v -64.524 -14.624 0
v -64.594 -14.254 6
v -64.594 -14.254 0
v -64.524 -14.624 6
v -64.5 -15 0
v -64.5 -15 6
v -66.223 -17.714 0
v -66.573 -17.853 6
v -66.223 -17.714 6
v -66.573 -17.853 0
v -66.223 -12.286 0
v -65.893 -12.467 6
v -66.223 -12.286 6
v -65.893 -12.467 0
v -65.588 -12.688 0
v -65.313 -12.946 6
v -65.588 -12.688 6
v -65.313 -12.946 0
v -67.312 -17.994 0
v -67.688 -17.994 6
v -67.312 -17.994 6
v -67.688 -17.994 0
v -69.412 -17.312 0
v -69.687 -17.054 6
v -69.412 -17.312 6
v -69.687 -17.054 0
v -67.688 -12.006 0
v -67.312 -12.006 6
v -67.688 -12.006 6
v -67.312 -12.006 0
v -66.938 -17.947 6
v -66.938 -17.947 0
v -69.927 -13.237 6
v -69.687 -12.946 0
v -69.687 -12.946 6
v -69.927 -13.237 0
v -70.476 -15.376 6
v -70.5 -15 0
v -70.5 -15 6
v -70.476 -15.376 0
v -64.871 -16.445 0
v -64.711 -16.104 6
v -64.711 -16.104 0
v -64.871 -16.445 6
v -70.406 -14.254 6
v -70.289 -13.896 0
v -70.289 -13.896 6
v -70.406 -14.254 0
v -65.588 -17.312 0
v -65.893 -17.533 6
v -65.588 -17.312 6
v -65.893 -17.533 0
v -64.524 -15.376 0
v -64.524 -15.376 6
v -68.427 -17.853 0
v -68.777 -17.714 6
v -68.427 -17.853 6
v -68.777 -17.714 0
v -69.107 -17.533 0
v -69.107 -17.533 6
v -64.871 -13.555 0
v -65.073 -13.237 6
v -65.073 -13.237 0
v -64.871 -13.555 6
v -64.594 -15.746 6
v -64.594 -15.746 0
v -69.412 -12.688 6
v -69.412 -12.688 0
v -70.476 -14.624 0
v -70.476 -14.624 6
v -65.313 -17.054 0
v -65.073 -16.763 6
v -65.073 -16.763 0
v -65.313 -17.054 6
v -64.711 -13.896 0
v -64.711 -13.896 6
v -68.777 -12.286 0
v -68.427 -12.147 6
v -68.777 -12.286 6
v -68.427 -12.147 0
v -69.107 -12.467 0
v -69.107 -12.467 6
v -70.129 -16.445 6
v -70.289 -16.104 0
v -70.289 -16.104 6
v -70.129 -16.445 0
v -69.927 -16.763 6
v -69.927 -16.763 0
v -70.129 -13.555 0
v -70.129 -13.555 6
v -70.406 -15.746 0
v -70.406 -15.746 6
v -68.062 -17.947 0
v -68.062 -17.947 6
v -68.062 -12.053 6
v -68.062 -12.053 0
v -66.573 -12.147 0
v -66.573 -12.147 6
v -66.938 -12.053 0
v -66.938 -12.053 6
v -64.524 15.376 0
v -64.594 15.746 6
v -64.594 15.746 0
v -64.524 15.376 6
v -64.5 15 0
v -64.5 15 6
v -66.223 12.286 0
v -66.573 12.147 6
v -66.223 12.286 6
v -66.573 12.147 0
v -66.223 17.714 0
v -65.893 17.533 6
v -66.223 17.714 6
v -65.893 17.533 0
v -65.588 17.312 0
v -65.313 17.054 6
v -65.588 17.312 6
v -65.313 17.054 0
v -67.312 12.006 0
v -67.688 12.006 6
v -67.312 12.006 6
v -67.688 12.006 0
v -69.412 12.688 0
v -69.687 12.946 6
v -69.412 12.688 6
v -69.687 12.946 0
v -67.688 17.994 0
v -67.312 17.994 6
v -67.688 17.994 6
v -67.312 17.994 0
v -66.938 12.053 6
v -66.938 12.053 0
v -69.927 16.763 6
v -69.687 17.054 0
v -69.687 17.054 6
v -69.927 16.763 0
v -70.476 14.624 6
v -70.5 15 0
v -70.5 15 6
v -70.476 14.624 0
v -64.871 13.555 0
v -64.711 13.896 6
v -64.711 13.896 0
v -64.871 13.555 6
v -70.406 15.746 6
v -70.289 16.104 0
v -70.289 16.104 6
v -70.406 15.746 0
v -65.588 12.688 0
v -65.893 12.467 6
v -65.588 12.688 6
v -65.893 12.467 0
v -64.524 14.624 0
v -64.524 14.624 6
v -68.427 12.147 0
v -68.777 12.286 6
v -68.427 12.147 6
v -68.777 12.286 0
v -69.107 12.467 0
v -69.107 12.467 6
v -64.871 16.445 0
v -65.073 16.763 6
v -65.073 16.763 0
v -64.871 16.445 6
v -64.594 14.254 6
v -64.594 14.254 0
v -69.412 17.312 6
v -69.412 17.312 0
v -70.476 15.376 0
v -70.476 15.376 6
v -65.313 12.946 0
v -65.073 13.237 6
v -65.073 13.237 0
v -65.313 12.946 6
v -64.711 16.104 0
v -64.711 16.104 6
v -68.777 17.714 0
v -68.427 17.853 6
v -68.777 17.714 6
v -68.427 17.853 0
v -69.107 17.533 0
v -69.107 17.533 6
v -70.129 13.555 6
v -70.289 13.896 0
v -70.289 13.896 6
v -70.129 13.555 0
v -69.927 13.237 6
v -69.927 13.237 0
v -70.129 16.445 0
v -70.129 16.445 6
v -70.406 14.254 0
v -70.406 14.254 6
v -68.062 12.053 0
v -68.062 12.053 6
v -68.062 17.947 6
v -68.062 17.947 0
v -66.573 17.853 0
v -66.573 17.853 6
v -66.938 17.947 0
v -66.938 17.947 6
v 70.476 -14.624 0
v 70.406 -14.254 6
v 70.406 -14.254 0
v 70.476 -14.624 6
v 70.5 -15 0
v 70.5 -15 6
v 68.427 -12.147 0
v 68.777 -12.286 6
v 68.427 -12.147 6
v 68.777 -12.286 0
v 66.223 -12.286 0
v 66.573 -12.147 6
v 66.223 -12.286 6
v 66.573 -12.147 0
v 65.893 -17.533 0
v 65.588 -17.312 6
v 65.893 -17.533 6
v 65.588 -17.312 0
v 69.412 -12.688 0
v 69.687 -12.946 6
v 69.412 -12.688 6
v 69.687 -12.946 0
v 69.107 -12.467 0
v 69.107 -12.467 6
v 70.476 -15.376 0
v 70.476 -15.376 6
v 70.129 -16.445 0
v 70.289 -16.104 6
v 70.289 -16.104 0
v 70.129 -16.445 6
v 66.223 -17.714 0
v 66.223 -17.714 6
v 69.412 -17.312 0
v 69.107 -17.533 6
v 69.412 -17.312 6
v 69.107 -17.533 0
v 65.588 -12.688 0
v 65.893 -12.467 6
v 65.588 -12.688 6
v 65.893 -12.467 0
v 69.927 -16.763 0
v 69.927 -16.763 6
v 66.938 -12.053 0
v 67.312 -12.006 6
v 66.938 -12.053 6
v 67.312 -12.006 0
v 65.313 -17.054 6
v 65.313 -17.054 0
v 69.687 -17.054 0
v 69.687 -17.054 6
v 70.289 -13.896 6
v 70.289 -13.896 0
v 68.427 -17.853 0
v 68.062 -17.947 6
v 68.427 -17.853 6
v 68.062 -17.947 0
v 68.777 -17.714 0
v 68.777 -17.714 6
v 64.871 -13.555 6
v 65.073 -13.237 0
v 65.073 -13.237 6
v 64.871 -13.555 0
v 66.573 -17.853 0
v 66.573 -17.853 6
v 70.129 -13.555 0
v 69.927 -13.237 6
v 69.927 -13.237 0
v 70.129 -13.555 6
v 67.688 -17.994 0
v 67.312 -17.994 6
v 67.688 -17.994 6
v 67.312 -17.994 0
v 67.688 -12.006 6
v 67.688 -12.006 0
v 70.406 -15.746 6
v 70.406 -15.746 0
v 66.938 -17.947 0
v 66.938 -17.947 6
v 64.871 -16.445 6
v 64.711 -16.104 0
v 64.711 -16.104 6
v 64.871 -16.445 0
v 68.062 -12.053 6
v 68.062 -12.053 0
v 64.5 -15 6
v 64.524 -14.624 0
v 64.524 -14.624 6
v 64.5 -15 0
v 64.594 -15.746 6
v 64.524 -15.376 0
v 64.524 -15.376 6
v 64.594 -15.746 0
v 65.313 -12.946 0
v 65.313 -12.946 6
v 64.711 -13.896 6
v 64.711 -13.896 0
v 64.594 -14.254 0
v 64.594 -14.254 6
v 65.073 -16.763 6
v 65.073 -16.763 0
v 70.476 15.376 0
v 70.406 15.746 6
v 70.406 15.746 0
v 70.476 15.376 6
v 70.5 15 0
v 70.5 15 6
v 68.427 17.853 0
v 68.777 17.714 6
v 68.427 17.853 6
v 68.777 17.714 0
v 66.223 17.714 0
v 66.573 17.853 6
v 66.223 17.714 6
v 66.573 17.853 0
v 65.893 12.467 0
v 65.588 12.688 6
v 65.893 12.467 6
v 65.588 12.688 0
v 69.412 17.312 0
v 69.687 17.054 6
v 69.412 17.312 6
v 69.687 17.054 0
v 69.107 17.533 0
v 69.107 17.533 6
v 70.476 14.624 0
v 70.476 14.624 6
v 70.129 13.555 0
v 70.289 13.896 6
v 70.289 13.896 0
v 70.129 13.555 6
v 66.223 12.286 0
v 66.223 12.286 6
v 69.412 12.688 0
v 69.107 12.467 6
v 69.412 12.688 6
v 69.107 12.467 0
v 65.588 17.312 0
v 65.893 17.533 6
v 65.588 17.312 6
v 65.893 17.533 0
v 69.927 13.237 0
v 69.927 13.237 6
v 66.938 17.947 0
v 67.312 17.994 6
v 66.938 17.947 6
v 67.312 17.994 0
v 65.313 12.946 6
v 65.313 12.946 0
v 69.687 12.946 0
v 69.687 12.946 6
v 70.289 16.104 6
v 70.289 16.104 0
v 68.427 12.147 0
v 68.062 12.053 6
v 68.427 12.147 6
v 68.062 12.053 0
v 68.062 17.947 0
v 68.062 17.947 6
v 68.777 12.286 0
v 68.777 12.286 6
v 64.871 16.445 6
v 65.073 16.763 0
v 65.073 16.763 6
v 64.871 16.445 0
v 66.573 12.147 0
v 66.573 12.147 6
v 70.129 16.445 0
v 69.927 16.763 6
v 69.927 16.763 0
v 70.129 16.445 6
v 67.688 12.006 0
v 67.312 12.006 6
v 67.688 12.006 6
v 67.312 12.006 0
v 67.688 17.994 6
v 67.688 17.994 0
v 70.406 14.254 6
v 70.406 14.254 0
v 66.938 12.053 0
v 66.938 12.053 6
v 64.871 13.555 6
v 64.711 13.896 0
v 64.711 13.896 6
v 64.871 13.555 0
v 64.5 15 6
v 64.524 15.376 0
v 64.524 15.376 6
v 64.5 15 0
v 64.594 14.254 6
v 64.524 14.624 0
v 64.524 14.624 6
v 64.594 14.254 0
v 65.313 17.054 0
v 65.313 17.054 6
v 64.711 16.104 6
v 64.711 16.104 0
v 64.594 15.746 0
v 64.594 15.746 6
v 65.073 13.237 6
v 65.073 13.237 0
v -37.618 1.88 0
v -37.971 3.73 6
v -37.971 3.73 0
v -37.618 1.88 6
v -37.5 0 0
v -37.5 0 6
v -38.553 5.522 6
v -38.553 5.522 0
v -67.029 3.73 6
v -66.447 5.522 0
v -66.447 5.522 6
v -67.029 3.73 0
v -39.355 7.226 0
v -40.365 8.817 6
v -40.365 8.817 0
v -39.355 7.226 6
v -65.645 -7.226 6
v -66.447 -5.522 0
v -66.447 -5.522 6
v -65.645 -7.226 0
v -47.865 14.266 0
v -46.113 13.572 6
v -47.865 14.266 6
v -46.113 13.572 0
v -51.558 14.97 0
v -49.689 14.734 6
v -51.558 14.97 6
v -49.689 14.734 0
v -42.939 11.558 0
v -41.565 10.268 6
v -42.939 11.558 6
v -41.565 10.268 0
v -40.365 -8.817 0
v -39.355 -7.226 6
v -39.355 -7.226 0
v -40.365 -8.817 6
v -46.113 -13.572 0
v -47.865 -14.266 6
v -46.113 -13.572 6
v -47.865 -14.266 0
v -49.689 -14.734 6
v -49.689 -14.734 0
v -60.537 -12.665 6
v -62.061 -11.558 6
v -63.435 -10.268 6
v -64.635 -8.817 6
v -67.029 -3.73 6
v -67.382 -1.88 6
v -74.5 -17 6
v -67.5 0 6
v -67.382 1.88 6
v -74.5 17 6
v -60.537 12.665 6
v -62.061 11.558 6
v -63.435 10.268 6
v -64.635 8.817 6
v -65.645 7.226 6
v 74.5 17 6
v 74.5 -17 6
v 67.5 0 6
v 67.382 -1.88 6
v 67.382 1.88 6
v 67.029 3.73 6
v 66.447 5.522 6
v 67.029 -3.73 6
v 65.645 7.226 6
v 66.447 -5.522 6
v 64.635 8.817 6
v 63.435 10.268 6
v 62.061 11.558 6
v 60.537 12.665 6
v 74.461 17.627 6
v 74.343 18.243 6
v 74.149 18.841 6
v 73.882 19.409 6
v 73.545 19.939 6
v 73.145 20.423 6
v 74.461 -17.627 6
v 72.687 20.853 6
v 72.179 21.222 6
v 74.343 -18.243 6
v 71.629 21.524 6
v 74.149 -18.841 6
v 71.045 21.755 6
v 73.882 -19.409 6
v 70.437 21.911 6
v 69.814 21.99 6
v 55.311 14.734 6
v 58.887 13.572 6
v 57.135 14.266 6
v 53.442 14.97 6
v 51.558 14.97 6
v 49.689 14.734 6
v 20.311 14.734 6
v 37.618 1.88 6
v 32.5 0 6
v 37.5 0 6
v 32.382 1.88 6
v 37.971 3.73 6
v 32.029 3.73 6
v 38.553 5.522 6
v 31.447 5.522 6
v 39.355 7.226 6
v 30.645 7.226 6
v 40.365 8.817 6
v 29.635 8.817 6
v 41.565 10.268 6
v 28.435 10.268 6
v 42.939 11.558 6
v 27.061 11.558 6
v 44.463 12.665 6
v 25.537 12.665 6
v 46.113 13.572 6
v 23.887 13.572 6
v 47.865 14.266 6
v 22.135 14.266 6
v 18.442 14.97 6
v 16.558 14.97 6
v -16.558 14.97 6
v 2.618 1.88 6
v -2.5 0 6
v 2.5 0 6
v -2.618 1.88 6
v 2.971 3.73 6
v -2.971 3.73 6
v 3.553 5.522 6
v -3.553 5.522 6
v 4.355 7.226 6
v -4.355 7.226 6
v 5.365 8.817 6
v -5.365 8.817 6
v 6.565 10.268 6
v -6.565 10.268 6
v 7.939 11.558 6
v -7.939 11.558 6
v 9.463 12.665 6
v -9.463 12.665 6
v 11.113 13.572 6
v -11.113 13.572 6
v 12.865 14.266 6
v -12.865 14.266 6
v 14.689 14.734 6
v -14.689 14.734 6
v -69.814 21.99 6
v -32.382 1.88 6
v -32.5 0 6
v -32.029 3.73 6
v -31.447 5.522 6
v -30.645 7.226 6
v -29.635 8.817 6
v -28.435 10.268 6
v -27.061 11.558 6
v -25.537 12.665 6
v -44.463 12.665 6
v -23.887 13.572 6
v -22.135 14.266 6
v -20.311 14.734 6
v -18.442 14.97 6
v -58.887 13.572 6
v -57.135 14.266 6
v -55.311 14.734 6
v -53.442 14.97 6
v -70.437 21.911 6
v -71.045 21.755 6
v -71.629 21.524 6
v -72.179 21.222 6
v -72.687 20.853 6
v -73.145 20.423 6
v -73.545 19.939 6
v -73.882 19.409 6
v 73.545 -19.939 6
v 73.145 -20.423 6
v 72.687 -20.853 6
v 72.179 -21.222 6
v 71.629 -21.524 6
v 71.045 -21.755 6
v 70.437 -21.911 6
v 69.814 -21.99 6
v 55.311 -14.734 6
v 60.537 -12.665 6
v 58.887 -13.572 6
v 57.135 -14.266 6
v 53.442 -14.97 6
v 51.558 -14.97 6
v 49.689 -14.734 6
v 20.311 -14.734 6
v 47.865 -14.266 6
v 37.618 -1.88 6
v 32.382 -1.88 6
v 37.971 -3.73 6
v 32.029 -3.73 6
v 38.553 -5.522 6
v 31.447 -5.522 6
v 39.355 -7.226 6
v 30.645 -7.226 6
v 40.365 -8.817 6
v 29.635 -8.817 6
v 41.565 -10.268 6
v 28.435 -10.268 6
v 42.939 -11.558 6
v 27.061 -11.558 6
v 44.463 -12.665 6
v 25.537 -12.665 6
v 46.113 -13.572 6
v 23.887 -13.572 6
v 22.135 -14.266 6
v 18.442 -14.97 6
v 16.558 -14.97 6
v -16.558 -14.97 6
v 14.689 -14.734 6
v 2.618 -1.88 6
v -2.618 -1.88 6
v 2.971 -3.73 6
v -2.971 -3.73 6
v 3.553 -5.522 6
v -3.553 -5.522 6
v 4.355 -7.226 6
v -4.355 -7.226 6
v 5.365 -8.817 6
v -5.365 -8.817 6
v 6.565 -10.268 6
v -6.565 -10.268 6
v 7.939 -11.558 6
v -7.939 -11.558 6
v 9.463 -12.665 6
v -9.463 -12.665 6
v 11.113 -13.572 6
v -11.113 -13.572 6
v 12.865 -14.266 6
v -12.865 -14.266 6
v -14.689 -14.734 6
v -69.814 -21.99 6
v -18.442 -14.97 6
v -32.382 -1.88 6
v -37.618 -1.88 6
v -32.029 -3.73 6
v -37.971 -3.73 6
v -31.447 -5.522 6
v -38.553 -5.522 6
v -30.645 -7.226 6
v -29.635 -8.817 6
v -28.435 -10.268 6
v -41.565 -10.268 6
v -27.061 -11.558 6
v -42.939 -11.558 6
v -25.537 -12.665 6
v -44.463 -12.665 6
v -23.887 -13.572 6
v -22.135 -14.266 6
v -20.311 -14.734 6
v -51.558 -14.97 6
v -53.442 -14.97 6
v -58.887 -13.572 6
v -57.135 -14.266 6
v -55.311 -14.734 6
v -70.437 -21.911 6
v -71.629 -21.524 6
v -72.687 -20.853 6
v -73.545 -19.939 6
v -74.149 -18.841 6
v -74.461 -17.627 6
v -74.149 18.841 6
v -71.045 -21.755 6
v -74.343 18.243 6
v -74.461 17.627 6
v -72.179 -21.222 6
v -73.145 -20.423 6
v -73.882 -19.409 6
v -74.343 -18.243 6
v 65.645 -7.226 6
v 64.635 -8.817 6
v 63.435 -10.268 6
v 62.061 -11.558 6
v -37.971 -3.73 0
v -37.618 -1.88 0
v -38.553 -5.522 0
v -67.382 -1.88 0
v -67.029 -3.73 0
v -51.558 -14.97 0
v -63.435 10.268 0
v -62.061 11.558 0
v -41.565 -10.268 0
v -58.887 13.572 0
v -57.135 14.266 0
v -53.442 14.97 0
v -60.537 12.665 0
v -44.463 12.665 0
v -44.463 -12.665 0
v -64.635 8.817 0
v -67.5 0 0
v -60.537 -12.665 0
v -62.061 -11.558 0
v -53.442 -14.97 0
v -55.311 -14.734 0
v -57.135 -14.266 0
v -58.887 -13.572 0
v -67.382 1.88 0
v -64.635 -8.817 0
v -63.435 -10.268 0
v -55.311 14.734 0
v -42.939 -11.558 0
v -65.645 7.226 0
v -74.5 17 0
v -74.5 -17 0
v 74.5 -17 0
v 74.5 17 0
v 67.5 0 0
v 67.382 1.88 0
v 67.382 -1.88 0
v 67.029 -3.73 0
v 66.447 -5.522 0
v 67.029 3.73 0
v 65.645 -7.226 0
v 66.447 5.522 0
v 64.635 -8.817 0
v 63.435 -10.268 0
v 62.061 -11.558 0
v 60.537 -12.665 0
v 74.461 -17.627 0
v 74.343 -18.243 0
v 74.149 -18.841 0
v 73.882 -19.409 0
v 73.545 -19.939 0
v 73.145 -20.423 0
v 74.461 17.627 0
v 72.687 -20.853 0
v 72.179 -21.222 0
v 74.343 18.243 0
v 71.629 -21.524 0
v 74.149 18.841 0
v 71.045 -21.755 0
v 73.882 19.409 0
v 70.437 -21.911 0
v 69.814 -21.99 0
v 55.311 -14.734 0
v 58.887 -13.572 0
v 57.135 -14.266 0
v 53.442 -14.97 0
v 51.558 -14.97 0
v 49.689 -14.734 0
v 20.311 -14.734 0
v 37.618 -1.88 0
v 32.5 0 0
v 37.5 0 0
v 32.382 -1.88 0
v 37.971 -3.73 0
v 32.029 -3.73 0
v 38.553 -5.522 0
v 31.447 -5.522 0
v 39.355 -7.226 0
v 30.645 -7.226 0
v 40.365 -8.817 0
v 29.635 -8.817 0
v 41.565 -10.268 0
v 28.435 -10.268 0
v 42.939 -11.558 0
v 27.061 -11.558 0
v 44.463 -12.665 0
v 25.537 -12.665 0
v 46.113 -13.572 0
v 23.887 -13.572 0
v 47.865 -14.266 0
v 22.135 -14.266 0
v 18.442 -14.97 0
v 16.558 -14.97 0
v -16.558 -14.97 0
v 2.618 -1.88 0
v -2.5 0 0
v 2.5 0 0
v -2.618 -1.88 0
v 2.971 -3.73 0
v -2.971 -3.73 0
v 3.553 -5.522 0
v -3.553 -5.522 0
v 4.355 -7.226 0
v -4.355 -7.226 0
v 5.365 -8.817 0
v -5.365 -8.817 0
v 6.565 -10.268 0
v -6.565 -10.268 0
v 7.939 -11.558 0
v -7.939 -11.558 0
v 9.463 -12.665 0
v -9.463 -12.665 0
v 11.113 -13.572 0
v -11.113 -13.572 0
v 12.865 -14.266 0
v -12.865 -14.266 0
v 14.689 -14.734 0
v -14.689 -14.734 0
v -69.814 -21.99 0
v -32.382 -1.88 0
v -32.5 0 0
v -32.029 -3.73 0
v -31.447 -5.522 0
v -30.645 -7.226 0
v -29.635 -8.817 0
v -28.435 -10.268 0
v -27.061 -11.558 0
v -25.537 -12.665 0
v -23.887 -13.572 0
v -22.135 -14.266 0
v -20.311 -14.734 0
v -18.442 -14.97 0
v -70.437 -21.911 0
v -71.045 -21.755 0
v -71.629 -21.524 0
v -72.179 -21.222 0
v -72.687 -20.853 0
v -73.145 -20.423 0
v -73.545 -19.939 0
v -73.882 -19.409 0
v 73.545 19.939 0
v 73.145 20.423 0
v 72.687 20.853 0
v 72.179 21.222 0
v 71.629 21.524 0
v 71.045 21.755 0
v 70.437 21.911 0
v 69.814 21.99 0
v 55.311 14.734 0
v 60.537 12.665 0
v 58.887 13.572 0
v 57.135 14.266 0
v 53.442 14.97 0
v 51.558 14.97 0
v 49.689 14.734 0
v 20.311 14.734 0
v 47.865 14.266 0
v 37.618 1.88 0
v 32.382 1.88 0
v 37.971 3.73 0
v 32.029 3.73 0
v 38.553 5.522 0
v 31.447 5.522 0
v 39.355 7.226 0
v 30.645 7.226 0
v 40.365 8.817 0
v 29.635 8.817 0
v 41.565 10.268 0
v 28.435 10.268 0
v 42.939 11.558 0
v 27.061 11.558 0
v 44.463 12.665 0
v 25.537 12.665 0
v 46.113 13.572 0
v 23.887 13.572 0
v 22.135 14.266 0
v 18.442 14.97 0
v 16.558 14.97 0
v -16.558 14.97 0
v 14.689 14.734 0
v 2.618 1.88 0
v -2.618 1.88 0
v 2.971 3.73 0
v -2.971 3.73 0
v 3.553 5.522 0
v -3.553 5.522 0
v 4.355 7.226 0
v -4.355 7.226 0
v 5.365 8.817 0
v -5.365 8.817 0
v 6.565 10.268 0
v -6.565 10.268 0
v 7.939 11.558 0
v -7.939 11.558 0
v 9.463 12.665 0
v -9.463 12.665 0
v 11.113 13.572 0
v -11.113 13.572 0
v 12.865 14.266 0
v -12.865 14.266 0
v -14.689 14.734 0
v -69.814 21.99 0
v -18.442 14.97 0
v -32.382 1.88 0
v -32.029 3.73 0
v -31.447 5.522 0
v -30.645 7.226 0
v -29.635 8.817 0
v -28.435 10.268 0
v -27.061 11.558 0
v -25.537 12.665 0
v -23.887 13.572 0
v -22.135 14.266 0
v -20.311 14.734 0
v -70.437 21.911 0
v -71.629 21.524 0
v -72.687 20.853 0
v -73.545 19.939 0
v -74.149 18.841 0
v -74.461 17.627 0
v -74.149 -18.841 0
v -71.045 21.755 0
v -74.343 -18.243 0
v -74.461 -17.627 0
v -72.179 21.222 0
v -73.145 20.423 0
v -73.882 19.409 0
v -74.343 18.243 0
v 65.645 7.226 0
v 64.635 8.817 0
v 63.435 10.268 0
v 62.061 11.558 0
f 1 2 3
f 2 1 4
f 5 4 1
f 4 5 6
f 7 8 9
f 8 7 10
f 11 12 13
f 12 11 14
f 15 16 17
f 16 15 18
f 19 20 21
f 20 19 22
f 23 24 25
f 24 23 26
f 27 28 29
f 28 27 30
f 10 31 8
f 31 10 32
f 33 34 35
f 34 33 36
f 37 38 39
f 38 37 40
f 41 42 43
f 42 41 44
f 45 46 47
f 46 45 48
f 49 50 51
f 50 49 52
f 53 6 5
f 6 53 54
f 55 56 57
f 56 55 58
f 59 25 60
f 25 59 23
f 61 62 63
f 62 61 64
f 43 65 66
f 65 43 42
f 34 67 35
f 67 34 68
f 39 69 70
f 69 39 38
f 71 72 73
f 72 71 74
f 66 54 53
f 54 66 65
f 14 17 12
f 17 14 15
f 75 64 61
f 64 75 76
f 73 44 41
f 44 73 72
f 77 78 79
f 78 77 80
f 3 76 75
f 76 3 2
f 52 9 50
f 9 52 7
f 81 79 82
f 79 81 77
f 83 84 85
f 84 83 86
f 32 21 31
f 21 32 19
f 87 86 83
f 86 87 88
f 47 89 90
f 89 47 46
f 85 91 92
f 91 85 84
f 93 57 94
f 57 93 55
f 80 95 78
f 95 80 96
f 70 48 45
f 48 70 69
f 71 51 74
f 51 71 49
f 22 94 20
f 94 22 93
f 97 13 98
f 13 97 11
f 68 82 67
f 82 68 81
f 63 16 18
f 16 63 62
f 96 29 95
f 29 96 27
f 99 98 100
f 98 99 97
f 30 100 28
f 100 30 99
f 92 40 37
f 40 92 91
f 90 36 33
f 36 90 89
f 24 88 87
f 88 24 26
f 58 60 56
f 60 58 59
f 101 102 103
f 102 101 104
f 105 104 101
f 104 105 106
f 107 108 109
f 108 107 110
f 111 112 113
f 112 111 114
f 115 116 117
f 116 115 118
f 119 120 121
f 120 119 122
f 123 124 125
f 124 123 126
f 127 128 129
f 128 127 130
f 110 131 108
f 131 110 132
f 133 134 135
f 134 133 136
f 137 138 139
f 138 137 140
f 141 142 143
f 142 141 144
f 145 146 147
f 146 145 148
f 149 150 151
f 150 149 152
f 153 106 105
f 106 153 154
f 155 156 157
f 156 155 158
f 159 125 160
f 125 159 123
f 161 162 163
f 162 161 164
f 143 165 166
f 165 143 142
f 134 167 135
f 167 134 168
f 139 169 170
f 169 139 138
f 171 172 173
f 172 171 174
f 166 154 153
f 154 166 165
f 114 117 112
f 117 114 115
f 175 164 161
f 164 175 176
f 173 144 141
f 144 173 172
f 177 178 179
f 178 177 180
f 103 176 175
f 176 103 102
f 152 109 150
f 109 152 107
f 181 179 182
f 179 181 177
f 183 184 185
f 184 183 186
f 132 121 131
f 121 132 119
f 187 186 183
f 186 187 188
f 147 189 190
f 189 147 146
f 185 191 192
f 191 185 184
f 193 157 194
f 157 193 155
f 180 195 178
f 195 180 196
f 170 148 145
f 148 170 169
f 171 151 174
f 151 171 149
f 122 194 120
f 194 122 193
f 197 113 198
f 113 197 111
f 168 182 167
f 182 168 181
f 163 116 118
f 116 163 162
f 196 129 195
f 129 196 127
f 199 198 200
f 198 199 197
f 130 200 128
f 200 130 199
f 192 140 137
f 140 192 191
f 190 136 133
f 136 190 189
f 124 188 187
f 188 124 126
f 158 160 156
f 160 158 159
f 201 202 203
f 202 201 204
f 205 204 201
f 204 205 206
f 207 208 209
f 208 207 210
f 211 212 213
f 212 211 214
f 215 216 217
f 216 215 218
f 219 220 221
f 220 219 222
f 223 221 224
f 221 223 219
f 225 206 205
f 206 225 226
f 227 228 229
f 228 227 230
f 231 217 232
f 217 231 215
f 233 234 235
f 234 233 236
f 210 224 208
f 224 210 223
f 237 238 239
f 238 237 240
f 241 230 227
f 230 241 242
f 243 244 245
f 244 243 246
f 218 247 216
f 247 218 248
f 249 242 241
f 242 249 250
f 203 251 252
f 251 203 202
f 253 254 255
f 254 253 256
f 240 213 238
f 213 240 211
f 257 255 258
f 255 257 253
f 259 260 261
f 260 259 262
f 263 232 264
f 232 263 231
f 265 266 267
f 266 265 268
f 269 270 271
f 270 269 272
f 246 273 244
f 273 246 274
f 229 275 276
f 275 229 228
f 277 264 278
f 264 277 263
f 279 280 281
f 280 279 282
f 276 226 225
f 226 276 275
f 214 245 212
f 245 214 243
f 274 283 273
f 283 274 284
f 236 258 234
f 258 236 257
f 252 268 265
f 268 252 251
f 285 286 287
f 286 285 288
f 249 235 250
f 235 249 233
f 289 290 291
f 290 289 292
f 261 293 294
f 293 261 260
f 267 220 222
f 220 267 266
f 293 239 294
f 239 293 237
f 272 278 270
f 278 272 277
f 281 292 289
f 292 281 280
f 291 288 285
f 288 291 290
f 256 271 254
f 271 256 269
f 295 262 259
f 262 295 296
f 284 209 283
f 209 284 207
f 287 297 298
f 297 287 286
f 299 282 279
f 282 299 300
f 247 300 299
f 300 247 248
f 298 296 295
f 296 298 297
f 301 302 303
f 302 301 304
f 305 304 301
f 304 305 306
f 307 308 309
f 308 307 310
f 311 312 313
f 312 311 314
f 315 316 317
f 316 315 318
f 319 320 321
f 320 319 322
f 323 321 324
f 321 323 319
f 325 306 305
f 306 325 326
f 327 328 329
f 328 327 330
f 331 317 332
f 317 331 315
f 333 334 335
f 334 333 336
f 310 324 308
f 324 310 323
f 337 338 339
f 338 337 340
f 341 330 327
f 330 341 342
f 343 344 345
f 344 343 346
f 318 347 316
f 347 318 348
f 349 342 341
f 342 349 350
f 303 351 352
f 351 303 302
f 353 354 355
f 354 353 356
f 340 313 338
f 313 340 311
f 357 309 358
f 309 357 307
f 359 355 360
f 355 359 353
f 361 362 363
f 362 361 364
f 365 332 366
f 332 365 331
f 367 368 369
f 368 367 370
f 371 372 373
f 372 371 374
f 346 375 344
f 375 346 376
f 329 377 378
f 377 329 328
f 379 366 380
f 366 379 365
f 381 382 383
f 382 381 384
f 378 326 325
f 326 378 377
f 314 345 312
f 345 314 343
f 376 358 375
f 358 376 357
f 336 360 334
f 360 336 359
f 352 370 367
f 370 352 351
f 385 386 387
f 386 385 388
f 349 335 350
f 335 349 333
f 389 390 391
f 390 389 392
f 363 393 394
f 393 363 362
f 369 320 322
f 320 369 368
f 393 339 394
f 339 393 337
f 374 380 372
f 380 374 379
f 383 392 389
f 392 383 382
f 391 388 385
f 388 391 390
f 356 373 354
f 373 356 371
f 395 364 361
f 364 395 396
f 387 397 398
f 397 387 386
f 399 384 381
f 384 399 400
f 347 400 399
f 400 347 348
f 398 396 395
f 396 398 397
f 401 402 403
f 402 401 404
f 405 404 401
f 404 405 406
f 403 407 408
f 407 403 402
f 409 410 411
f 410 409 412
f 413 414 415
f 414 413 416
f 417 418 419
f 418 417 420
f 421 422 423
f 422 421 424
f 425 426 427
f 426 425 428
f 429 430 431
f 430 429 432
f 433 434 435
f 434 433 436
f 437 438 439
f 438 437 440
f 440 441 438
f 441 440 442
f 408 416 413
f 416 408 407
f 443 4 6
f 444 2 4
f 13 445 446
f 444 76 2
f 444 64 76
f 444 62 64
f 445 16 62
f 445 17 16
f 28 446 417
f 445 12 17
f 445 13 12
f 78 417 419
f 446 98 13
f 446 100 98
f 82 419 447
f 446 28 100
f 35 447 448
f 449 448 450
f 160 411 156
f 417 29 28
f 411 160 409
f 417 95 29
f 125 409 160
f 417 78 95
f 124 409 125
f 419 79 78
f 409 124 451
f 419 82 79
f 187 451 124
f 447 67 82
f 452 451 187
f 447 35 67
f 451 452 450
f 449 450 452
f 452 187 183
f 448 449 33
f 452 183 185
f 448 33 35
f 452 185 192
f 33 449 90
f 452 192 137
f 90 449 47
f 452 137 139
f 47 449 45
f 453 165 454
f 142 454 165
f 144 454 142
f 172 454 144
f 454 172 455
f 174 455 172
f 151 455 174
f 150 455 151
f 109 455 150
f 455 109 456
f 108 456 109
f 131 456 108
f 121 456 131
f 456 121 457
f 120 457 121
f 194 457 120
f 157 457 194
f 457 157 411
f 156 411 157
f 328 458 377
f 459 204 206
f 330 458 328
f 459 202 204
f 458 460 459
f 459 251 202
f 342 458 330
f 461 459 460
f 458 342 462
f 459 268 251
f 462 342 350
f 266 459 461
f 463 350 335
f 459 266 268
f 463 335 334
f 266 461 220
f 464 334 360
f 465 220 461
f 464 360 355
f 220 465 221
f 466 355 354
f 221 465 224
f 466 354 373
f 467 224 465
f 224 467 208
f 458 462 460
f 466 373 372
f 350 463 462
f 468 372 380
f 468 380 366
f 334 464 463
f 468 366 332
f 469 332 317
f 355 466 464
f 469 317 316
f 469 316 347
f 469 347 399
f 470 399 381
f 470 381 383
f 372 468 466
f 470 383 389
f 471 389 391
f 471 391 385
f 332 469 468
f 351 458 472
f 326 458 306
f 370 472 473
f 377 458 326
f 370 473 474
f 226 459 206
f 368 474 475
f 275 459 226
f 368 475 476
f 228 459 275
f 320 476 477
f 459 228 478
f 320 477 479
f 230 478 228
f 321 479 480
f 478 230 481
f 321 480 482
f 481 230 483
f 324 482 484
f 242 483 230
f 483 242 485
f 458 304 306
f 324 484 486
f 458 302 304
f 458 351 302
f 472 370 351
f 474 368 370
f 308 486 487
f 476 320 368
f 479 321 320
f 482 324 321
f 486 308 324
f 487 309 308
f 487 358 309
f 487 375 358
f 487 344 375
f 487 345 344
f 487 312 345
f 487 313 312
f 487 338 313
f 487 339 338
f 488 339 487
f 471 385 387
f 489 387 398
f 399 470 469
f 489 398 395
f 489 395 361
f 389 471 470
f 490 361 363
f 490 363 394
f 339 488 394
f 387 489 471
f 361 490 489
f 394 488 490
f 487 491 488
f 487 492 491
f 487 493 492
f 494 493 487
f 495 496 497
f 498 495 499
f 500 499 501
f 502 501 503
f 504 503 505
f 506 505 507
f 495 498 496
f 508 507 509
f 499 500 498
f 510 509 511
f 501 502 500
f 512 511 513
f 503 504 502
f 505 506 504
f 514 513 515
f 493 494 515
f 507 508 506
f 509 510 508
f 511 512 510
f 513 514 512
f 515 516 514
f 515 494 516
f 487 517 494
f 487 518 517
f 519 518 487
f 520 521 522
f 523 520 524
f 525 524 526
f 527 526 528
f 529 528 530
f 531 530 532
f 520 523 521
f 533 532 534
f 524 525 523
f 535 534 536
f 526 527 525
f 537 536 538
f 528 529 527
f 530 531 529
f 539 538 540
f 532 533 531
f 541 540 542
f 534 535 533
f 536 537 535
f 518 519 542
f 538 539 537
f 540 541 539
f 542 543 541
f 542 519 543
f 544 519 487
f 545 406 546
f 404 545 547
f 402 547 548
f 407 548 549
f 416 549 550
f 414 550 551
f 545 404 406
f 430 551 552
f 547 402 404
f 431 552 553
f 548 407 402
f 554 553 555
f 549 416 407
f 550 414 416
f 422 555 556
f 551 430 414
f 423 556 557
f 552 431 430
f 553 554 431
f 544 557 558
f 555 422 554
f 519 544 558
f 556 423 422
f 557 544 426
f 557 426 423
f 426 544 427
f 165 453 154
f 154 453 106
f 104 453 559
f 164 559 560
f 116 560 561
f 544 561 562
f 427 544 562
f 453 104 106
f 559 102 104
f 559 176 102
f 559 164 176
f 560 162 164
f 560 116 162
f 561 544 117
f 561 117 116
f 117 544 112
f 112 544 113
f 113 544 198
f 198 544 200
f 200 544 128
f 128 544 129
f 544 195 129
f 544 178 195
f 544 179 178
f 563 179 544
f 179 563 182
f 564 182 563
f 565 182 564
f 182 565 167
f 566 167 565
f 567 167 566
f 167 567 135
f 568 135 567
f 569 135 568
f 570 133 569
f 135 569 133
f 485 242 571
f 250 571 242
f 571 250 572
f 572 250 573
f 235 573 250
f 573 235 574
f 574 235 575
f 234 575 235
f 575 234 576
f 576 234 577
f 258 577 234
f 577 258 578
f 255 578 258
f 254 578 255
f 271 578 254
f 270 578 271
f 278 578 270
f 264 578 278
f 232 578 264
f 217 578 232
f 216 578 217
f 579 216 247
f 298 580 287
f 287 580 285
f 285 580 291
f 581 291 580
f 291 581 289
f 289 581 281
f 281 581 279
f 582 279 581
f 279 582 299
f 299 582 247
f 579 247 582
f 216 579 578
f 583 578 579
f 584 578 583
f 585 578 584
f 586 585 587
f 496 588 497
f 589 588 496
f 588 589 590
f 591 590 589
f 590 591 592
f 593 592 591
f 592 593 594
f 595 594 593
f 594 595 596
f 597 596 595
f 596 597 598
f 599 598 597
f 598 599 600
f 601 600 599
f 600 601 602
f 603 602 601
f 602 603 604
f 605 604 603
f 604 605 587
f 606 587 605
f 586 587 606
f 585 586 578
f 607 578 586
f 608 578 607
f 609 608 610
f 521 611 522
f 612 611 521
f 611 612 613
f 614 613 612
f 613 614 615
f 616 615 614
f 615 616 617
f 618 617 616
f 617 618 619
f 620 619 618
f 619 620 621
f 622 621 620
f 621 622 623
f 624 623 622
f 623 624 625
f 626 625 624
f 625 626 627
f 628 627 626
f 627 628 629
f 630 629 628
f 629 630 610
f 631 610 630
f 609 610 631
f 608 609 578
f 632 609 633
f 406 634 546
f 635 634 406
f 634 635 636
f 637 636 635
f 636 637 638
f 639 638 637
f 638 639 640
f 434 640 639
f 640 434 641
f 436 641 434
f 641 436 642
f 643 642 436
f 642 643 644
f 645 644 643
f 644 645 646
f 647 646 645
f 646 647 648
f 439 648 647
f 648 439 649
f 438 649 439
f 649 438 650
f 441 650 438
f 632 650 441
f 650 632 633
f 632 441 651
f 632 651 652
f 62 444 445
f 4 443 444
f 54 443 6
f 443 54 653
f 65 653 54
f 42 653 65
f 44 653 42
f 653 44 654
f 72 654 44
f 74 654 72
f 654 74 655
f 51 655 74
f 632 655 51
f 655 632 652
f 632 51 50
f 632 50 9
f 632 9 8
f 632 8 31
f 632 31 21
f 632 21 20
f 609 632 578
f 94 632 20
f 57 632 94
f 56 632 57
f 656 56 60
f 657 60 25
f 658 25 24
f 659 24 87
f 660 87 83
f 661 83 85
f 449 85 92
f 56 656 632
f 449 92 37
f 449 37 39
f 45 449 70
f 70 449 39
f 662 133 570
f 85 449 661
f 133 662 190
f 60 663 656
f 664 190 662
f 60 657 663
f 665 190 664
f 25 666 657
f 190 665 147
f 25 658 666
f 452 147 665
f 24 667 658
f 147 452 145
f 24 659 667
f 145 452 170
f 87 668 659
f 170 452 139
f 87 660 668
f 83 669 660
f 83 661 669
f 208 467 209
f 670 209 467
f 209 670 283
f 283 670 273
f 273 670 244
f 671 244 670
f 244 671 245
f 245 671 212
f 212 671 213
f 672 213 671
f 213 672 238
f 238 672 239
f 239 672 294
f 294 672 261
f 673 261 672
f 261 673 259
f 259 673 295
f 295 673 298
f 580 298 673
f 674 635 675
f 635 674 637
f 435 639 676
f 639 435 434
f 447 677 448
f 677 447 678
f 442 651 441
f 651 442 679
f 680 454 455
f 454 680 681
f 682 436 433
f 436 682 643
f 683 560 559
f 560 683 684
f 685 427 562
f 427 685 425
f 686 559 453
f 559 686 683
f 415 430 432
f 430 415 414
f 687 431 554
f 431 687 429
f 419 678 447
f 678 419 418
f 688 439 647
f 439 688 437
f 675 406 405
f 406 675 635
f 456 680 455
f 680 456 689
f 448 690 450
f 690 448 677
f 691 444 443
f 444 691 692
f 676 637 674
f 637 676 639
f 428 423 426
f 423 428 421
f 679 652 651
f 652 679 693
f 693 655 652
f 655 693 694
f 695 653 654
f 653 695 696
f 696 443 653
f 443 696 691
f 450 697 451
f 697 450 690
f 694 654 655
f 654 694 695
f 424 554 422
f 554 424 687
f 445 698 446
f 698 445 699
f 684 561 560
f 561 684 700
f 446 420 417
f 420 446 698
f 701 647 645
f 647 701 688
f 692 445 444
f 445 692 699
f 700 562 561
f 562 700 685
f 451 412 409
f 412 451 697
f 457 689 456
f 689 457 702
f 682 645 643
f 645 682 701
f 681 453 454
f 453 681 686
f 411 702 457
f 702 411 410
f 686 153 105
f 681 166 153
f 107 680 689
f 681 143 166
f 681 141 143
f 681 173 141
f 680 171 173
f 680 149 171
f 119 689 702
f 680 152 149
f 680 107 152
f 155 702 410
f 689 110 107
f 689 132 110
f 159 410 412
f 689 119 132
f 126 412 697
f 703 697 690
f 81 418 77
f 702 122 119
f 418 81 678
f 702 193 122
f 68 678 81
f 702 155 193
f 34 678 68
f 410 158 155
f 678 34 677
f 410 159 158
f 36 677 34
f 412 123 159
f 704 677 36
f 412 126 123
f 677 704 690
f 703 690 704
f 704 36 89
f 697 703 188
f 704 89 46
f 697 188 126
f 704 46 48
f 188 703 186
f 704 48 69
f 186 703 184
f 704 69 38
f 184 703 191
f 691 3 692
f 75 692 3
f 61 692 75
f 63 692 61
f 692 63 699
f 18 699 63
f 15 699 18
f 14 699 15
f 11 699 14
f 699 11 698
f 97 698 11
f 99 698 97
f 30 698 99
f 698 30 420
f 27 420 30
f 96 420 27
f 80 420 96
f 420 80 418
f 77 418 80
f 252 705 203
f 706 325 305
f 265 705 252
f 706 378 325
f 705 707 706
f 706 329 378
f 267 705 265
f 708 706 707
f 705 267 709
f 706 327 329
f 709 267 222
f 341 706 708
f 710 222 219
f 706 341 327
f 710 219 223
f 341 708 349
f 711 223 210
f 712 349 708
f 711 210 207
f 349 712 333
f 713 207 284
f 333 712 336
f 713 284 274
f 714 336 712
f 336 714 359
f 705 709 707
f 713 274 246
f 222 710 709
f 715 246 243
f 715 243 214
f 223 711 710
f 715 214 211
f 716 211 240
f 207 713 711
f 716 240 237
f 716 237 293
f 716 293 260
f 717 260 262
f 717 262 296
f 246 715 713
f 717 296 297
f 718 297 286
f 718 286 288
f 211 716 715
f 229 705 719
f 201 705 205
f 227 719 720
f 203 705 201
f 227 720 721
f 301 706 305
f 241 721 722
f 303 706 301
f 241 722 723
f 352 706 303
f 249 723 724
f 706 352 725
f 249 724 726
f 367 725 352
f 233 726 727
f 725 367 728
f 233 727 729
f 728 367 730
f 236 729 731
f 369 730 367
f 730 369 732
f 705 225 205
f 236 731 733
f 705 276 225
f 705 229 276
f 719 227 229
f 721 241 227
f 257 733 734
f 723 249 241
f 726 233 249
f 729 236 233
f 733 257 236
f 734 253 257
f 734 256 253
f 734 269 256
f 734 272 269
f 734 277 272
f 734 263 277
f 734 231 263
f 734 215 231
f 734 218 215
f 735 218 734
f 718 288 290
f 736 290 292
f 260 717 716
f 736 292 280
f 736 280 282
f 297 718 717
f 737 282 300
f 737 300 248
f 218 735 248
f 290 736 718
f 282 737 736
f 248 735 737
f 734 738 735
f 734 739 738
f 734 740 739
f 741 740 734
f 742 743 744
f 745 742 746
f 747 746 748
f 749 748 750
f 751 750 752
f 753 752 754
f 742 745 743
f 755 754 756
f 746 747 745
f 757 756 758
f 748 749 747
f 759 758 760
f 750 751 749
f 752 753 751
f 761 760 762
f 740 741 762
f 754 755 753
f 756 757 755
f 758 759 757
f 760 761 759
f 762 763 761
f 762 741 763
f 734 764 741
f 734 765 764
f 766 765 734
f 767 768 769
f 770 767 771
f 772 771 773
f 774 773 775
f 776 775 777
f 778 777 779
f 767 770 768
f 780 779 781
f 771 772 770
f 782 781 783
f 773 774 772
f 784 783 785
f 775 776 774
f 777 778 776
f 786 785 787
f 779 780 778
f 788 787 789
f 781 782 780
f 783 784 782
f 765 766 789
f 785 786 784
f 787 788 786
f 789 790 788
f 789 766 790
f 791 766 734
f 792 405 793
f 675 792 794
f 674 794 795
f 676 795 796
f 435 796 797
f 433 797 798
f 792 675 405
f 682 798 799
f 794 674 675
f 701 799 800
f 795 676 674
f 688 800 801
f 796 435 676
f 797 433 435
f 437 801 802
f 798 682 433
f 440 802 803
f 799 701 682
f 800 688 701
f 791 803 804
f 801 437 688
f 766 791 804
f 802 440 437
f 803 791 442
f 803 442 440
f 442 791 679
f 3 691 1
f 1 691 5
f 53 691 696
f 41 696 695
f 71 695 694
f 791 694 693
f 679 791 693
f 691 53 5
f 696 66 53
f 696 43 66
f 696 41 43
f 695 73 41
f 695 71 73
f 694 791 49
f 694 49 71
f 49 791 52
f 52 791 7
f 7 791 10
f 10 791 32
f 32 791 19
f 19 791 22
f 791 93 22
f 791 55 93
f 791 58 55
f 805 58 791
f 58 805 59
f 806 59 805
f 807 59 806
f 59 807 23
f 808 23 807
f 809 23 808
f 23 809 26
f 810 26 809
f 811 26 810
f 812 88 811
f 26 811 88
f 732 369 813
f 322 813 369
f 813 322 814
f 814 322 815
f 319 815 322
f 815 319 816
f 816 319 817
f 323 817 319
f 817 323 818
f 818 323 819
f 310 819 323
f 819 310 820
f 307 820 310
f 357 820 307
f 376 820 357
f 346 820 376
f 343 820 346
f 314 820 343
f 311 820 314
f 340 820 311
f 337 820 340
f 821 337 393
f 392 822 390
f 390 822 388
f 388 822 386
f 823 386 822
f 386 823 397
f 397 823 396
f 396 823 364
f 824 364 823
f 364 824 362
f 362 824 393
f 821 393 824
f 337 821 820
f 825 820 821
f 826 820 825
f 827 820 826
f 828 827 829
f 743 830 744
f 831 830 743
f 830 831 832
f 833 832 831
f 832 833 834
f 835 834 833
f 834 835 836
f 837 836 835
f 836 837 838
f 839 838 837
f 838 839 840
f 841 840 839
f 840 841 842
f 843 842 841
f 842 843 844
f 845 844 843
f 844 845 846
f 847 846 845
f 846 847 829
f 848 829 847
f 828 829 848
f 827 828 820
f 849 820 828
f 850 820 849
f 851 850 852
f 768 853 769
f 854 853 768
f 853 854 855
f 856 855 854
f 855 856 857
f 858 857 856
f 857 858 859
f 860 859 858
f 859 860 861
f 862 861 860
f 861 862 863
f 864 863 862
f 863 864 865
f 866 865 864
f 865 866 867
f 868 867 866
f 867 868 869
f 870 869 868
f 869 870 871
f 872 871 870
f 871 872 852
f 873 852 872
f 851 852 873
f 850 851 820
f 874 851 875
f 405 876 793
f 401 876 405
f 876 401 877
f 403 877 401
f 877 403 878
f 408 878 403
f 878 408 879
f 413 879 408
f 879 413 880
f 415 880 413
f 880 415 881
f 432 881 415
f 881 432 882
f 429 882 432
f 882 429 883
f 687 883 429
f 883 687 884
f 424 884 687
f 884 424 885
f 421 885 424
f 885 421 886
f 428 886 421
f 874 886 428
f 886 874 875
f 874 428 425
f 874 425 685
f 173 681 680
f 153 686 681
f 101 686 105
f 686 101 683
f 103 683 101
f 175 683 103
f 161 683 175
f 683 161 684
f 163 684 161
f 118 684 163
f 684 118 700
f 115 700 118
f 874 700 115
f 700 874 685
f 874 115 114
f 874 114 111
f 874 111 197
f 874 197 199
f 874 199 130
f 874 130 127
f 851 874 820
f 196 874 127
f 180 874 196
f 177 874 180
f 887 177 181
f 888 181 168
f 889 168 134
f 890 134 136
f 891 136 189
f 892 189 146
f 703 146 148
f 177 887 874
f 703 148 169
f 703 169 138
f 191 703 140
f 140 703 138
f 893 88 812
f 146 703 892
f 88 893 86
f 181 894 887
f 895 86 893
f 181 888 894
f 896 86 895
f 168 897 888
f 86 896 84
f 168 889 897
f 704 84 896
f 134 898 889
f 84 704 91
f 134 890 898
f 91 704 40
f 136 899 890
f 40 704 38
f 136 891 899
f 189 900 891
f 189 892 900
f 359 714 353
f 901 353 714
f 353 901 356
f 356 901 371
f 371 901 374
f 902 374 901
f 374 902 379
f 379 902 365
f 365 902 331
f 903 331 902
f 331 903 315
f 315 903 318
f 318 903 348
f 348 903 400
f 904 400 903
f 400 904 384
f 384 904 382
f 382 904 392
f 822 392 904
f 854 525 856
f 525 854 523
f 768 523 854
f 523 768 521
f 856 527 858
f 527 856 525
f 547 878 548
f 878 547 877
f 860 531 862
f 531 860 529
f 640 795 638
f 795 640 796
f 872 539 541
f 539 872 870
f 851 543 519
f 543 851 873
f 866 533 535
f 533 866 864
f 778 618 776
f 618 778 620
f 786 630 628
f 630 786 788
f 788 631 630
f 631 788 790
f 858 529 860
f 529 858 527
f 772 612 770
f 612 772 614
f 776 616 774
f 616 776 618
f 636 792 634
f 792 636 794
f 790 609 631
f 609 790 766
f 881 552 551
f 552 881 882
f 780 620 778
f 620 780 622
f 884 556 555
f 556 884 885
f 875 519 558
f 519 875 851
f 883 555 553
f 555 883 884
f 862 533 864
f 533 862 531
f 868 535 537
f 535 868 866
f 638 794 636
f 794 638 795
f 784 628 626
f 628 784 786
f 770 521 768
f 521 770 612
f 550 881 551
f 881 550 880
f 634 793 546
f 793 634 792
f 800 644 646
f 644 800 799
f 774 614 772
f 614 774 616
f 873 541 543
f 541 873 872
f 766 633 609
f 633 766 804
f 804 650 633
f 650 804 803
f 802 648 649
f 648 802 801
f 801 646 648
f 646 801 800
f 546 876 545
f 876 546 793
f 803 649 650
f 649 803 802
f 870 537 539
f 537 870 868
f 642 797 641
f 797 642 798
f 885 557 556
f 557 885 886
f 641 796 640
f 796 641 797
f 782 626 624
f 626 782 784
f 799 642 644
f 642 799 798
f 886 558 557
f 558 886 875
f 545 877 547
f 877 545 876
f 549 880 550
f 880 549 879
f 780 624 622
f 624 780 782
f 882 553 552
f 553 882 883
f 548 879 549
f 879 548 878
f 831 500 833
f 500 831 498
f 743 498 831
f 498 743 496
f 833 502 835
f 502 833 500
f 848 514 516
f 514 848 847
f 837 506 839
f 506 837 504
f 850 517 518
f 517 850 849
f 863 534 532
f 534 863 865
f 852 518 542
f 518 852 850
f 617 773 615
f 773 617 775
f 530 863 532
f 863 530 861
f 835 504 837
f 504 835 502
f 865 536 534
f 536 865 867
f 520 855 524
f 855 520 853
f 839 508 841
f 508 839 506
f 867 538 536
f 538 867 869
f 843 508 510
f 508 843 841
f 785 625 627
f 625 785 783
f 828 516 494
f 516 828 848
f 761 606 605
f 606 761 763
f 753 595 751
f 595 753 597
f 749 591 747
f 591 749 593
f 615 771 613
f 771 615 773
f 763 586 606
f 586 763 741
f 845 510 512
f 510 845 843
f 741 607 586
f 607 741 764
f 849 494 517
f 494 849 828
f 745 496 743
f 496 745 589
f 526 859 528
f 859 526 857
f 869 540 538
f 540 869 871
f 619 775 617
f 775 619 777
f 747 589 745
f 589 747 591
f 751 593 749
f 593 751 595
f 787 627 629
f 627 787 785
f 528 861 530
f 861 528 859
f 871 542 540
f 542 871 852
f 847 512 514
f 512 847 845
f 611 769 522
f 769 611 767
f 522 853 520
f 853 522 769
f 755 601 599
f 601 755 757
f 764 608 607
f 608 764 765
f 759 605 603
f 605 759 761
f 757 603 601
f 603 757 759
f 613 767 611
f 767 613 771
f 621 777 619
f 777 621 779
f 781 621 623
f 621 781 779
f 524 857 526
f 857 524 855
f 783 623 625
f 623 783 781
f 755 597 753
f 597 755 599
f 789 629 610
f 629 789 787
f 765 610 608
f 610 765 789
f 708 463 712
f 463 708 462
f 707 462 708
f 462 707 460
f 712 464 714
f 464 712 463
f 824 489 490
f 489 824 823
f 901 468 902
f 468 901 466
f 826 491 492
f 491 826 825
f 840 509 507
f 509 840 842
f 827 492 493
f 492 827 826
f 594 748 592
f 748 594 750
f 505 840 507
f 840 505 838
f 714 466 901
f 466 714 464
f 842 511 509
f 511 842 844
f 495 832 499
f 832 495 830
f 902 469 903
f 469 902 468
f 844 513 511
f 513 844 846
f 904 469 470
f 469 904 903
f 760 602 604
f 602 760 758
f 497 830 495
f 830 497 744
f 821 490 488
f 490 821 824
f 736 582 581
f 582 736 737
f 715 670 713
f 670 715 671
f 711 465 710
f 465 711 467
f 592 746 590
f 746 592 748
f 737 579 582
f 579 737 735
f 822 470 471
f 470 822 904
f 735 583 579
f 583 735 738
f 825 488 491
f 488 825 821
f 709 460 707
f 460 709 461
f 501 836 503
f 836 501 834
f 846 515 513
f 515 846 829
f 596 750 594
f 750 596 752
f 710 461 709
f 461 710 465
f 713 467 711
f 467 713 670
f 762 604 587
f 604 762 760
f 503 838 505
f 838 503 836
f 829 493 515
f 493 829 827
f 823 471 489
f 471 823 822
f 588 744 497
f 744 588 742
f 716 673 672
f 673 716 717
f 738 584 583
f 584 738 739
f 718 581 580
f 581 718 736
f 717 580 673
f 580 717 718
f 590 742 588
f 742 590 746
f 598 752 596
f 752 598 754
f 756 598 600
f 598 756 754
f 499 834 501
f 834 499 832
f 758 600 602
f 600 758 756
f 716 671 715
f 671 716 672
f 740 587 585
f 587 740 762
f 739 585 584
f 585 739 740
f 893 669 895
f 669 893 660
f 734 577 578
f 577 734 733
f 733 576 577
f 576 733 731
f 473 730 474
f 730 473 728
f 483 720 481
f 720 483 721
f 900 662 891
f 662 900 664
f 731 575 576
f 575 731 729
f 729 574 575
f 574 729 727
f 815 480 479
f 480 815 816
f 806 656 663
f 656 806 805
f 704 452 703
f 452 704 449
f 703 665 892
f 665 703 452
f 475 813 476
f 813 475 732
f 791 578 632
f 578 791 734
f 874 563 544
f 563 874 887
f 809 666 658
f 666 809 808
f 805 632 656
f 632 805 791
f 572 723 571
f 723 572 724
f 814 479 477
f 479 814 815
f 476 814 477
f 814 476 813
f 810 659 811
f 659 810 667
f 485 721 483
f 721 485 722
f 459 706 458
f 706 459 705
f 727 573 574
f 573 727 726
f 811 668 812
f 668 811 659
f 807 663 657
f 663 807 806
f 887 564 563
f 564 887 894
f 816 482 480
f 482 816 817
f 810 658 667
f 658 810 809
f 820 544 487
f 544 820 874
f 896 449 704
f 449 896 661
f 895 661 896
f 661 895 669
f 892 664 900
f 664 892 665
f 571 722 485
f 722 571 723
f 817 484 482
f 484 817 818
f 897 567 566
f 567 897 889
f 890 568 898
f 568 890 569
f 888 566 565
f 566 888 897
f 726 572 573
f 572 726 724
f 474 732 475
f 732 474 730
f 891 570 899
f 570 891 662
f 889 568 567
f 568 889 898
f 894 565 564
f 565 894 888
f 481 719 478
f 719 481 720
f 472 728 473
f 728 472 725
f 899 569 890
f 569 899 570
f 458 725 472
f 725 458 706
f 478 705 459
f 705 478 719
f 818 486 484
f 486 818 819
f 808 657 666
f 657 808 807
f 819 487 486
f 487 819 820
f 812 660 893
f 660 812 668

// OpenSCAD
$fn = 50;

difference() {
	union() {
		hull() {
			translate(v = [-69.5, 17.0, 0]) {
				cylinder(h = 6, r = 5);
			}
			translate(v = [69.5, 17.0, 0]) {
				cylinder(h = 6, r = 5);
			}
			translate(v = [-69.5, -17.0, 0]) {
				cylinder(h = 6, r = 5);
			}
			translate(v = [69.5, -17.0, 0]) {
				cylinder(h = 6, r = 5);
			}
		}
	}
	union() {
		translate(v = [-67.5, -15.0, -100.0]) {
			cylinder(h = 200, r = 3.0);
		}
		translate(v = [-67.5, 15.0, -100.0]) {
			cylinder(h = 200, r = 3.0);
		}
		translate(v = [67.5, -15.0, -100.0]) {
			cylinder(h = 200, r = 3.0);
		}
		translate(v = [67.5, 15.0, -100.0]) {
			cylinder(h = 200, r = 3.0);
		}
		translate(v = [-67.5, -15.0, -100.0]) {
			cylinder(h = 200, r = 1.5);
		}
		translate(v = [-67.5, 15.0, -100.0]) {
			cylinder(h = 200, r = 1.5);
		}
		translate(v = [67.5, -15.0, -100.0]) {
			cylinder(h = 200, r = 1.5);
		}
		translate(v = [67.5, 15.0, -100.0]) {
			cylinder(h = 200, r = 1.5);
		}
		translate(v = [-52.5, 0, 0.0]) {
			cylinder(h = 6, r = 15.0);
		}
		translate(v = [-17.5, 0, 0.0]) {
			cylinder(h = 6, r = 15.0);
		}
		translate(v = [17.5, 0, 0.0]) {
			cylinder(h = 6, r = 15.0);
		}
		translate(v = [52.5, 0, 0.0]) {
			cylinder(h = 6, r = 15.0);
		}
	}
}
